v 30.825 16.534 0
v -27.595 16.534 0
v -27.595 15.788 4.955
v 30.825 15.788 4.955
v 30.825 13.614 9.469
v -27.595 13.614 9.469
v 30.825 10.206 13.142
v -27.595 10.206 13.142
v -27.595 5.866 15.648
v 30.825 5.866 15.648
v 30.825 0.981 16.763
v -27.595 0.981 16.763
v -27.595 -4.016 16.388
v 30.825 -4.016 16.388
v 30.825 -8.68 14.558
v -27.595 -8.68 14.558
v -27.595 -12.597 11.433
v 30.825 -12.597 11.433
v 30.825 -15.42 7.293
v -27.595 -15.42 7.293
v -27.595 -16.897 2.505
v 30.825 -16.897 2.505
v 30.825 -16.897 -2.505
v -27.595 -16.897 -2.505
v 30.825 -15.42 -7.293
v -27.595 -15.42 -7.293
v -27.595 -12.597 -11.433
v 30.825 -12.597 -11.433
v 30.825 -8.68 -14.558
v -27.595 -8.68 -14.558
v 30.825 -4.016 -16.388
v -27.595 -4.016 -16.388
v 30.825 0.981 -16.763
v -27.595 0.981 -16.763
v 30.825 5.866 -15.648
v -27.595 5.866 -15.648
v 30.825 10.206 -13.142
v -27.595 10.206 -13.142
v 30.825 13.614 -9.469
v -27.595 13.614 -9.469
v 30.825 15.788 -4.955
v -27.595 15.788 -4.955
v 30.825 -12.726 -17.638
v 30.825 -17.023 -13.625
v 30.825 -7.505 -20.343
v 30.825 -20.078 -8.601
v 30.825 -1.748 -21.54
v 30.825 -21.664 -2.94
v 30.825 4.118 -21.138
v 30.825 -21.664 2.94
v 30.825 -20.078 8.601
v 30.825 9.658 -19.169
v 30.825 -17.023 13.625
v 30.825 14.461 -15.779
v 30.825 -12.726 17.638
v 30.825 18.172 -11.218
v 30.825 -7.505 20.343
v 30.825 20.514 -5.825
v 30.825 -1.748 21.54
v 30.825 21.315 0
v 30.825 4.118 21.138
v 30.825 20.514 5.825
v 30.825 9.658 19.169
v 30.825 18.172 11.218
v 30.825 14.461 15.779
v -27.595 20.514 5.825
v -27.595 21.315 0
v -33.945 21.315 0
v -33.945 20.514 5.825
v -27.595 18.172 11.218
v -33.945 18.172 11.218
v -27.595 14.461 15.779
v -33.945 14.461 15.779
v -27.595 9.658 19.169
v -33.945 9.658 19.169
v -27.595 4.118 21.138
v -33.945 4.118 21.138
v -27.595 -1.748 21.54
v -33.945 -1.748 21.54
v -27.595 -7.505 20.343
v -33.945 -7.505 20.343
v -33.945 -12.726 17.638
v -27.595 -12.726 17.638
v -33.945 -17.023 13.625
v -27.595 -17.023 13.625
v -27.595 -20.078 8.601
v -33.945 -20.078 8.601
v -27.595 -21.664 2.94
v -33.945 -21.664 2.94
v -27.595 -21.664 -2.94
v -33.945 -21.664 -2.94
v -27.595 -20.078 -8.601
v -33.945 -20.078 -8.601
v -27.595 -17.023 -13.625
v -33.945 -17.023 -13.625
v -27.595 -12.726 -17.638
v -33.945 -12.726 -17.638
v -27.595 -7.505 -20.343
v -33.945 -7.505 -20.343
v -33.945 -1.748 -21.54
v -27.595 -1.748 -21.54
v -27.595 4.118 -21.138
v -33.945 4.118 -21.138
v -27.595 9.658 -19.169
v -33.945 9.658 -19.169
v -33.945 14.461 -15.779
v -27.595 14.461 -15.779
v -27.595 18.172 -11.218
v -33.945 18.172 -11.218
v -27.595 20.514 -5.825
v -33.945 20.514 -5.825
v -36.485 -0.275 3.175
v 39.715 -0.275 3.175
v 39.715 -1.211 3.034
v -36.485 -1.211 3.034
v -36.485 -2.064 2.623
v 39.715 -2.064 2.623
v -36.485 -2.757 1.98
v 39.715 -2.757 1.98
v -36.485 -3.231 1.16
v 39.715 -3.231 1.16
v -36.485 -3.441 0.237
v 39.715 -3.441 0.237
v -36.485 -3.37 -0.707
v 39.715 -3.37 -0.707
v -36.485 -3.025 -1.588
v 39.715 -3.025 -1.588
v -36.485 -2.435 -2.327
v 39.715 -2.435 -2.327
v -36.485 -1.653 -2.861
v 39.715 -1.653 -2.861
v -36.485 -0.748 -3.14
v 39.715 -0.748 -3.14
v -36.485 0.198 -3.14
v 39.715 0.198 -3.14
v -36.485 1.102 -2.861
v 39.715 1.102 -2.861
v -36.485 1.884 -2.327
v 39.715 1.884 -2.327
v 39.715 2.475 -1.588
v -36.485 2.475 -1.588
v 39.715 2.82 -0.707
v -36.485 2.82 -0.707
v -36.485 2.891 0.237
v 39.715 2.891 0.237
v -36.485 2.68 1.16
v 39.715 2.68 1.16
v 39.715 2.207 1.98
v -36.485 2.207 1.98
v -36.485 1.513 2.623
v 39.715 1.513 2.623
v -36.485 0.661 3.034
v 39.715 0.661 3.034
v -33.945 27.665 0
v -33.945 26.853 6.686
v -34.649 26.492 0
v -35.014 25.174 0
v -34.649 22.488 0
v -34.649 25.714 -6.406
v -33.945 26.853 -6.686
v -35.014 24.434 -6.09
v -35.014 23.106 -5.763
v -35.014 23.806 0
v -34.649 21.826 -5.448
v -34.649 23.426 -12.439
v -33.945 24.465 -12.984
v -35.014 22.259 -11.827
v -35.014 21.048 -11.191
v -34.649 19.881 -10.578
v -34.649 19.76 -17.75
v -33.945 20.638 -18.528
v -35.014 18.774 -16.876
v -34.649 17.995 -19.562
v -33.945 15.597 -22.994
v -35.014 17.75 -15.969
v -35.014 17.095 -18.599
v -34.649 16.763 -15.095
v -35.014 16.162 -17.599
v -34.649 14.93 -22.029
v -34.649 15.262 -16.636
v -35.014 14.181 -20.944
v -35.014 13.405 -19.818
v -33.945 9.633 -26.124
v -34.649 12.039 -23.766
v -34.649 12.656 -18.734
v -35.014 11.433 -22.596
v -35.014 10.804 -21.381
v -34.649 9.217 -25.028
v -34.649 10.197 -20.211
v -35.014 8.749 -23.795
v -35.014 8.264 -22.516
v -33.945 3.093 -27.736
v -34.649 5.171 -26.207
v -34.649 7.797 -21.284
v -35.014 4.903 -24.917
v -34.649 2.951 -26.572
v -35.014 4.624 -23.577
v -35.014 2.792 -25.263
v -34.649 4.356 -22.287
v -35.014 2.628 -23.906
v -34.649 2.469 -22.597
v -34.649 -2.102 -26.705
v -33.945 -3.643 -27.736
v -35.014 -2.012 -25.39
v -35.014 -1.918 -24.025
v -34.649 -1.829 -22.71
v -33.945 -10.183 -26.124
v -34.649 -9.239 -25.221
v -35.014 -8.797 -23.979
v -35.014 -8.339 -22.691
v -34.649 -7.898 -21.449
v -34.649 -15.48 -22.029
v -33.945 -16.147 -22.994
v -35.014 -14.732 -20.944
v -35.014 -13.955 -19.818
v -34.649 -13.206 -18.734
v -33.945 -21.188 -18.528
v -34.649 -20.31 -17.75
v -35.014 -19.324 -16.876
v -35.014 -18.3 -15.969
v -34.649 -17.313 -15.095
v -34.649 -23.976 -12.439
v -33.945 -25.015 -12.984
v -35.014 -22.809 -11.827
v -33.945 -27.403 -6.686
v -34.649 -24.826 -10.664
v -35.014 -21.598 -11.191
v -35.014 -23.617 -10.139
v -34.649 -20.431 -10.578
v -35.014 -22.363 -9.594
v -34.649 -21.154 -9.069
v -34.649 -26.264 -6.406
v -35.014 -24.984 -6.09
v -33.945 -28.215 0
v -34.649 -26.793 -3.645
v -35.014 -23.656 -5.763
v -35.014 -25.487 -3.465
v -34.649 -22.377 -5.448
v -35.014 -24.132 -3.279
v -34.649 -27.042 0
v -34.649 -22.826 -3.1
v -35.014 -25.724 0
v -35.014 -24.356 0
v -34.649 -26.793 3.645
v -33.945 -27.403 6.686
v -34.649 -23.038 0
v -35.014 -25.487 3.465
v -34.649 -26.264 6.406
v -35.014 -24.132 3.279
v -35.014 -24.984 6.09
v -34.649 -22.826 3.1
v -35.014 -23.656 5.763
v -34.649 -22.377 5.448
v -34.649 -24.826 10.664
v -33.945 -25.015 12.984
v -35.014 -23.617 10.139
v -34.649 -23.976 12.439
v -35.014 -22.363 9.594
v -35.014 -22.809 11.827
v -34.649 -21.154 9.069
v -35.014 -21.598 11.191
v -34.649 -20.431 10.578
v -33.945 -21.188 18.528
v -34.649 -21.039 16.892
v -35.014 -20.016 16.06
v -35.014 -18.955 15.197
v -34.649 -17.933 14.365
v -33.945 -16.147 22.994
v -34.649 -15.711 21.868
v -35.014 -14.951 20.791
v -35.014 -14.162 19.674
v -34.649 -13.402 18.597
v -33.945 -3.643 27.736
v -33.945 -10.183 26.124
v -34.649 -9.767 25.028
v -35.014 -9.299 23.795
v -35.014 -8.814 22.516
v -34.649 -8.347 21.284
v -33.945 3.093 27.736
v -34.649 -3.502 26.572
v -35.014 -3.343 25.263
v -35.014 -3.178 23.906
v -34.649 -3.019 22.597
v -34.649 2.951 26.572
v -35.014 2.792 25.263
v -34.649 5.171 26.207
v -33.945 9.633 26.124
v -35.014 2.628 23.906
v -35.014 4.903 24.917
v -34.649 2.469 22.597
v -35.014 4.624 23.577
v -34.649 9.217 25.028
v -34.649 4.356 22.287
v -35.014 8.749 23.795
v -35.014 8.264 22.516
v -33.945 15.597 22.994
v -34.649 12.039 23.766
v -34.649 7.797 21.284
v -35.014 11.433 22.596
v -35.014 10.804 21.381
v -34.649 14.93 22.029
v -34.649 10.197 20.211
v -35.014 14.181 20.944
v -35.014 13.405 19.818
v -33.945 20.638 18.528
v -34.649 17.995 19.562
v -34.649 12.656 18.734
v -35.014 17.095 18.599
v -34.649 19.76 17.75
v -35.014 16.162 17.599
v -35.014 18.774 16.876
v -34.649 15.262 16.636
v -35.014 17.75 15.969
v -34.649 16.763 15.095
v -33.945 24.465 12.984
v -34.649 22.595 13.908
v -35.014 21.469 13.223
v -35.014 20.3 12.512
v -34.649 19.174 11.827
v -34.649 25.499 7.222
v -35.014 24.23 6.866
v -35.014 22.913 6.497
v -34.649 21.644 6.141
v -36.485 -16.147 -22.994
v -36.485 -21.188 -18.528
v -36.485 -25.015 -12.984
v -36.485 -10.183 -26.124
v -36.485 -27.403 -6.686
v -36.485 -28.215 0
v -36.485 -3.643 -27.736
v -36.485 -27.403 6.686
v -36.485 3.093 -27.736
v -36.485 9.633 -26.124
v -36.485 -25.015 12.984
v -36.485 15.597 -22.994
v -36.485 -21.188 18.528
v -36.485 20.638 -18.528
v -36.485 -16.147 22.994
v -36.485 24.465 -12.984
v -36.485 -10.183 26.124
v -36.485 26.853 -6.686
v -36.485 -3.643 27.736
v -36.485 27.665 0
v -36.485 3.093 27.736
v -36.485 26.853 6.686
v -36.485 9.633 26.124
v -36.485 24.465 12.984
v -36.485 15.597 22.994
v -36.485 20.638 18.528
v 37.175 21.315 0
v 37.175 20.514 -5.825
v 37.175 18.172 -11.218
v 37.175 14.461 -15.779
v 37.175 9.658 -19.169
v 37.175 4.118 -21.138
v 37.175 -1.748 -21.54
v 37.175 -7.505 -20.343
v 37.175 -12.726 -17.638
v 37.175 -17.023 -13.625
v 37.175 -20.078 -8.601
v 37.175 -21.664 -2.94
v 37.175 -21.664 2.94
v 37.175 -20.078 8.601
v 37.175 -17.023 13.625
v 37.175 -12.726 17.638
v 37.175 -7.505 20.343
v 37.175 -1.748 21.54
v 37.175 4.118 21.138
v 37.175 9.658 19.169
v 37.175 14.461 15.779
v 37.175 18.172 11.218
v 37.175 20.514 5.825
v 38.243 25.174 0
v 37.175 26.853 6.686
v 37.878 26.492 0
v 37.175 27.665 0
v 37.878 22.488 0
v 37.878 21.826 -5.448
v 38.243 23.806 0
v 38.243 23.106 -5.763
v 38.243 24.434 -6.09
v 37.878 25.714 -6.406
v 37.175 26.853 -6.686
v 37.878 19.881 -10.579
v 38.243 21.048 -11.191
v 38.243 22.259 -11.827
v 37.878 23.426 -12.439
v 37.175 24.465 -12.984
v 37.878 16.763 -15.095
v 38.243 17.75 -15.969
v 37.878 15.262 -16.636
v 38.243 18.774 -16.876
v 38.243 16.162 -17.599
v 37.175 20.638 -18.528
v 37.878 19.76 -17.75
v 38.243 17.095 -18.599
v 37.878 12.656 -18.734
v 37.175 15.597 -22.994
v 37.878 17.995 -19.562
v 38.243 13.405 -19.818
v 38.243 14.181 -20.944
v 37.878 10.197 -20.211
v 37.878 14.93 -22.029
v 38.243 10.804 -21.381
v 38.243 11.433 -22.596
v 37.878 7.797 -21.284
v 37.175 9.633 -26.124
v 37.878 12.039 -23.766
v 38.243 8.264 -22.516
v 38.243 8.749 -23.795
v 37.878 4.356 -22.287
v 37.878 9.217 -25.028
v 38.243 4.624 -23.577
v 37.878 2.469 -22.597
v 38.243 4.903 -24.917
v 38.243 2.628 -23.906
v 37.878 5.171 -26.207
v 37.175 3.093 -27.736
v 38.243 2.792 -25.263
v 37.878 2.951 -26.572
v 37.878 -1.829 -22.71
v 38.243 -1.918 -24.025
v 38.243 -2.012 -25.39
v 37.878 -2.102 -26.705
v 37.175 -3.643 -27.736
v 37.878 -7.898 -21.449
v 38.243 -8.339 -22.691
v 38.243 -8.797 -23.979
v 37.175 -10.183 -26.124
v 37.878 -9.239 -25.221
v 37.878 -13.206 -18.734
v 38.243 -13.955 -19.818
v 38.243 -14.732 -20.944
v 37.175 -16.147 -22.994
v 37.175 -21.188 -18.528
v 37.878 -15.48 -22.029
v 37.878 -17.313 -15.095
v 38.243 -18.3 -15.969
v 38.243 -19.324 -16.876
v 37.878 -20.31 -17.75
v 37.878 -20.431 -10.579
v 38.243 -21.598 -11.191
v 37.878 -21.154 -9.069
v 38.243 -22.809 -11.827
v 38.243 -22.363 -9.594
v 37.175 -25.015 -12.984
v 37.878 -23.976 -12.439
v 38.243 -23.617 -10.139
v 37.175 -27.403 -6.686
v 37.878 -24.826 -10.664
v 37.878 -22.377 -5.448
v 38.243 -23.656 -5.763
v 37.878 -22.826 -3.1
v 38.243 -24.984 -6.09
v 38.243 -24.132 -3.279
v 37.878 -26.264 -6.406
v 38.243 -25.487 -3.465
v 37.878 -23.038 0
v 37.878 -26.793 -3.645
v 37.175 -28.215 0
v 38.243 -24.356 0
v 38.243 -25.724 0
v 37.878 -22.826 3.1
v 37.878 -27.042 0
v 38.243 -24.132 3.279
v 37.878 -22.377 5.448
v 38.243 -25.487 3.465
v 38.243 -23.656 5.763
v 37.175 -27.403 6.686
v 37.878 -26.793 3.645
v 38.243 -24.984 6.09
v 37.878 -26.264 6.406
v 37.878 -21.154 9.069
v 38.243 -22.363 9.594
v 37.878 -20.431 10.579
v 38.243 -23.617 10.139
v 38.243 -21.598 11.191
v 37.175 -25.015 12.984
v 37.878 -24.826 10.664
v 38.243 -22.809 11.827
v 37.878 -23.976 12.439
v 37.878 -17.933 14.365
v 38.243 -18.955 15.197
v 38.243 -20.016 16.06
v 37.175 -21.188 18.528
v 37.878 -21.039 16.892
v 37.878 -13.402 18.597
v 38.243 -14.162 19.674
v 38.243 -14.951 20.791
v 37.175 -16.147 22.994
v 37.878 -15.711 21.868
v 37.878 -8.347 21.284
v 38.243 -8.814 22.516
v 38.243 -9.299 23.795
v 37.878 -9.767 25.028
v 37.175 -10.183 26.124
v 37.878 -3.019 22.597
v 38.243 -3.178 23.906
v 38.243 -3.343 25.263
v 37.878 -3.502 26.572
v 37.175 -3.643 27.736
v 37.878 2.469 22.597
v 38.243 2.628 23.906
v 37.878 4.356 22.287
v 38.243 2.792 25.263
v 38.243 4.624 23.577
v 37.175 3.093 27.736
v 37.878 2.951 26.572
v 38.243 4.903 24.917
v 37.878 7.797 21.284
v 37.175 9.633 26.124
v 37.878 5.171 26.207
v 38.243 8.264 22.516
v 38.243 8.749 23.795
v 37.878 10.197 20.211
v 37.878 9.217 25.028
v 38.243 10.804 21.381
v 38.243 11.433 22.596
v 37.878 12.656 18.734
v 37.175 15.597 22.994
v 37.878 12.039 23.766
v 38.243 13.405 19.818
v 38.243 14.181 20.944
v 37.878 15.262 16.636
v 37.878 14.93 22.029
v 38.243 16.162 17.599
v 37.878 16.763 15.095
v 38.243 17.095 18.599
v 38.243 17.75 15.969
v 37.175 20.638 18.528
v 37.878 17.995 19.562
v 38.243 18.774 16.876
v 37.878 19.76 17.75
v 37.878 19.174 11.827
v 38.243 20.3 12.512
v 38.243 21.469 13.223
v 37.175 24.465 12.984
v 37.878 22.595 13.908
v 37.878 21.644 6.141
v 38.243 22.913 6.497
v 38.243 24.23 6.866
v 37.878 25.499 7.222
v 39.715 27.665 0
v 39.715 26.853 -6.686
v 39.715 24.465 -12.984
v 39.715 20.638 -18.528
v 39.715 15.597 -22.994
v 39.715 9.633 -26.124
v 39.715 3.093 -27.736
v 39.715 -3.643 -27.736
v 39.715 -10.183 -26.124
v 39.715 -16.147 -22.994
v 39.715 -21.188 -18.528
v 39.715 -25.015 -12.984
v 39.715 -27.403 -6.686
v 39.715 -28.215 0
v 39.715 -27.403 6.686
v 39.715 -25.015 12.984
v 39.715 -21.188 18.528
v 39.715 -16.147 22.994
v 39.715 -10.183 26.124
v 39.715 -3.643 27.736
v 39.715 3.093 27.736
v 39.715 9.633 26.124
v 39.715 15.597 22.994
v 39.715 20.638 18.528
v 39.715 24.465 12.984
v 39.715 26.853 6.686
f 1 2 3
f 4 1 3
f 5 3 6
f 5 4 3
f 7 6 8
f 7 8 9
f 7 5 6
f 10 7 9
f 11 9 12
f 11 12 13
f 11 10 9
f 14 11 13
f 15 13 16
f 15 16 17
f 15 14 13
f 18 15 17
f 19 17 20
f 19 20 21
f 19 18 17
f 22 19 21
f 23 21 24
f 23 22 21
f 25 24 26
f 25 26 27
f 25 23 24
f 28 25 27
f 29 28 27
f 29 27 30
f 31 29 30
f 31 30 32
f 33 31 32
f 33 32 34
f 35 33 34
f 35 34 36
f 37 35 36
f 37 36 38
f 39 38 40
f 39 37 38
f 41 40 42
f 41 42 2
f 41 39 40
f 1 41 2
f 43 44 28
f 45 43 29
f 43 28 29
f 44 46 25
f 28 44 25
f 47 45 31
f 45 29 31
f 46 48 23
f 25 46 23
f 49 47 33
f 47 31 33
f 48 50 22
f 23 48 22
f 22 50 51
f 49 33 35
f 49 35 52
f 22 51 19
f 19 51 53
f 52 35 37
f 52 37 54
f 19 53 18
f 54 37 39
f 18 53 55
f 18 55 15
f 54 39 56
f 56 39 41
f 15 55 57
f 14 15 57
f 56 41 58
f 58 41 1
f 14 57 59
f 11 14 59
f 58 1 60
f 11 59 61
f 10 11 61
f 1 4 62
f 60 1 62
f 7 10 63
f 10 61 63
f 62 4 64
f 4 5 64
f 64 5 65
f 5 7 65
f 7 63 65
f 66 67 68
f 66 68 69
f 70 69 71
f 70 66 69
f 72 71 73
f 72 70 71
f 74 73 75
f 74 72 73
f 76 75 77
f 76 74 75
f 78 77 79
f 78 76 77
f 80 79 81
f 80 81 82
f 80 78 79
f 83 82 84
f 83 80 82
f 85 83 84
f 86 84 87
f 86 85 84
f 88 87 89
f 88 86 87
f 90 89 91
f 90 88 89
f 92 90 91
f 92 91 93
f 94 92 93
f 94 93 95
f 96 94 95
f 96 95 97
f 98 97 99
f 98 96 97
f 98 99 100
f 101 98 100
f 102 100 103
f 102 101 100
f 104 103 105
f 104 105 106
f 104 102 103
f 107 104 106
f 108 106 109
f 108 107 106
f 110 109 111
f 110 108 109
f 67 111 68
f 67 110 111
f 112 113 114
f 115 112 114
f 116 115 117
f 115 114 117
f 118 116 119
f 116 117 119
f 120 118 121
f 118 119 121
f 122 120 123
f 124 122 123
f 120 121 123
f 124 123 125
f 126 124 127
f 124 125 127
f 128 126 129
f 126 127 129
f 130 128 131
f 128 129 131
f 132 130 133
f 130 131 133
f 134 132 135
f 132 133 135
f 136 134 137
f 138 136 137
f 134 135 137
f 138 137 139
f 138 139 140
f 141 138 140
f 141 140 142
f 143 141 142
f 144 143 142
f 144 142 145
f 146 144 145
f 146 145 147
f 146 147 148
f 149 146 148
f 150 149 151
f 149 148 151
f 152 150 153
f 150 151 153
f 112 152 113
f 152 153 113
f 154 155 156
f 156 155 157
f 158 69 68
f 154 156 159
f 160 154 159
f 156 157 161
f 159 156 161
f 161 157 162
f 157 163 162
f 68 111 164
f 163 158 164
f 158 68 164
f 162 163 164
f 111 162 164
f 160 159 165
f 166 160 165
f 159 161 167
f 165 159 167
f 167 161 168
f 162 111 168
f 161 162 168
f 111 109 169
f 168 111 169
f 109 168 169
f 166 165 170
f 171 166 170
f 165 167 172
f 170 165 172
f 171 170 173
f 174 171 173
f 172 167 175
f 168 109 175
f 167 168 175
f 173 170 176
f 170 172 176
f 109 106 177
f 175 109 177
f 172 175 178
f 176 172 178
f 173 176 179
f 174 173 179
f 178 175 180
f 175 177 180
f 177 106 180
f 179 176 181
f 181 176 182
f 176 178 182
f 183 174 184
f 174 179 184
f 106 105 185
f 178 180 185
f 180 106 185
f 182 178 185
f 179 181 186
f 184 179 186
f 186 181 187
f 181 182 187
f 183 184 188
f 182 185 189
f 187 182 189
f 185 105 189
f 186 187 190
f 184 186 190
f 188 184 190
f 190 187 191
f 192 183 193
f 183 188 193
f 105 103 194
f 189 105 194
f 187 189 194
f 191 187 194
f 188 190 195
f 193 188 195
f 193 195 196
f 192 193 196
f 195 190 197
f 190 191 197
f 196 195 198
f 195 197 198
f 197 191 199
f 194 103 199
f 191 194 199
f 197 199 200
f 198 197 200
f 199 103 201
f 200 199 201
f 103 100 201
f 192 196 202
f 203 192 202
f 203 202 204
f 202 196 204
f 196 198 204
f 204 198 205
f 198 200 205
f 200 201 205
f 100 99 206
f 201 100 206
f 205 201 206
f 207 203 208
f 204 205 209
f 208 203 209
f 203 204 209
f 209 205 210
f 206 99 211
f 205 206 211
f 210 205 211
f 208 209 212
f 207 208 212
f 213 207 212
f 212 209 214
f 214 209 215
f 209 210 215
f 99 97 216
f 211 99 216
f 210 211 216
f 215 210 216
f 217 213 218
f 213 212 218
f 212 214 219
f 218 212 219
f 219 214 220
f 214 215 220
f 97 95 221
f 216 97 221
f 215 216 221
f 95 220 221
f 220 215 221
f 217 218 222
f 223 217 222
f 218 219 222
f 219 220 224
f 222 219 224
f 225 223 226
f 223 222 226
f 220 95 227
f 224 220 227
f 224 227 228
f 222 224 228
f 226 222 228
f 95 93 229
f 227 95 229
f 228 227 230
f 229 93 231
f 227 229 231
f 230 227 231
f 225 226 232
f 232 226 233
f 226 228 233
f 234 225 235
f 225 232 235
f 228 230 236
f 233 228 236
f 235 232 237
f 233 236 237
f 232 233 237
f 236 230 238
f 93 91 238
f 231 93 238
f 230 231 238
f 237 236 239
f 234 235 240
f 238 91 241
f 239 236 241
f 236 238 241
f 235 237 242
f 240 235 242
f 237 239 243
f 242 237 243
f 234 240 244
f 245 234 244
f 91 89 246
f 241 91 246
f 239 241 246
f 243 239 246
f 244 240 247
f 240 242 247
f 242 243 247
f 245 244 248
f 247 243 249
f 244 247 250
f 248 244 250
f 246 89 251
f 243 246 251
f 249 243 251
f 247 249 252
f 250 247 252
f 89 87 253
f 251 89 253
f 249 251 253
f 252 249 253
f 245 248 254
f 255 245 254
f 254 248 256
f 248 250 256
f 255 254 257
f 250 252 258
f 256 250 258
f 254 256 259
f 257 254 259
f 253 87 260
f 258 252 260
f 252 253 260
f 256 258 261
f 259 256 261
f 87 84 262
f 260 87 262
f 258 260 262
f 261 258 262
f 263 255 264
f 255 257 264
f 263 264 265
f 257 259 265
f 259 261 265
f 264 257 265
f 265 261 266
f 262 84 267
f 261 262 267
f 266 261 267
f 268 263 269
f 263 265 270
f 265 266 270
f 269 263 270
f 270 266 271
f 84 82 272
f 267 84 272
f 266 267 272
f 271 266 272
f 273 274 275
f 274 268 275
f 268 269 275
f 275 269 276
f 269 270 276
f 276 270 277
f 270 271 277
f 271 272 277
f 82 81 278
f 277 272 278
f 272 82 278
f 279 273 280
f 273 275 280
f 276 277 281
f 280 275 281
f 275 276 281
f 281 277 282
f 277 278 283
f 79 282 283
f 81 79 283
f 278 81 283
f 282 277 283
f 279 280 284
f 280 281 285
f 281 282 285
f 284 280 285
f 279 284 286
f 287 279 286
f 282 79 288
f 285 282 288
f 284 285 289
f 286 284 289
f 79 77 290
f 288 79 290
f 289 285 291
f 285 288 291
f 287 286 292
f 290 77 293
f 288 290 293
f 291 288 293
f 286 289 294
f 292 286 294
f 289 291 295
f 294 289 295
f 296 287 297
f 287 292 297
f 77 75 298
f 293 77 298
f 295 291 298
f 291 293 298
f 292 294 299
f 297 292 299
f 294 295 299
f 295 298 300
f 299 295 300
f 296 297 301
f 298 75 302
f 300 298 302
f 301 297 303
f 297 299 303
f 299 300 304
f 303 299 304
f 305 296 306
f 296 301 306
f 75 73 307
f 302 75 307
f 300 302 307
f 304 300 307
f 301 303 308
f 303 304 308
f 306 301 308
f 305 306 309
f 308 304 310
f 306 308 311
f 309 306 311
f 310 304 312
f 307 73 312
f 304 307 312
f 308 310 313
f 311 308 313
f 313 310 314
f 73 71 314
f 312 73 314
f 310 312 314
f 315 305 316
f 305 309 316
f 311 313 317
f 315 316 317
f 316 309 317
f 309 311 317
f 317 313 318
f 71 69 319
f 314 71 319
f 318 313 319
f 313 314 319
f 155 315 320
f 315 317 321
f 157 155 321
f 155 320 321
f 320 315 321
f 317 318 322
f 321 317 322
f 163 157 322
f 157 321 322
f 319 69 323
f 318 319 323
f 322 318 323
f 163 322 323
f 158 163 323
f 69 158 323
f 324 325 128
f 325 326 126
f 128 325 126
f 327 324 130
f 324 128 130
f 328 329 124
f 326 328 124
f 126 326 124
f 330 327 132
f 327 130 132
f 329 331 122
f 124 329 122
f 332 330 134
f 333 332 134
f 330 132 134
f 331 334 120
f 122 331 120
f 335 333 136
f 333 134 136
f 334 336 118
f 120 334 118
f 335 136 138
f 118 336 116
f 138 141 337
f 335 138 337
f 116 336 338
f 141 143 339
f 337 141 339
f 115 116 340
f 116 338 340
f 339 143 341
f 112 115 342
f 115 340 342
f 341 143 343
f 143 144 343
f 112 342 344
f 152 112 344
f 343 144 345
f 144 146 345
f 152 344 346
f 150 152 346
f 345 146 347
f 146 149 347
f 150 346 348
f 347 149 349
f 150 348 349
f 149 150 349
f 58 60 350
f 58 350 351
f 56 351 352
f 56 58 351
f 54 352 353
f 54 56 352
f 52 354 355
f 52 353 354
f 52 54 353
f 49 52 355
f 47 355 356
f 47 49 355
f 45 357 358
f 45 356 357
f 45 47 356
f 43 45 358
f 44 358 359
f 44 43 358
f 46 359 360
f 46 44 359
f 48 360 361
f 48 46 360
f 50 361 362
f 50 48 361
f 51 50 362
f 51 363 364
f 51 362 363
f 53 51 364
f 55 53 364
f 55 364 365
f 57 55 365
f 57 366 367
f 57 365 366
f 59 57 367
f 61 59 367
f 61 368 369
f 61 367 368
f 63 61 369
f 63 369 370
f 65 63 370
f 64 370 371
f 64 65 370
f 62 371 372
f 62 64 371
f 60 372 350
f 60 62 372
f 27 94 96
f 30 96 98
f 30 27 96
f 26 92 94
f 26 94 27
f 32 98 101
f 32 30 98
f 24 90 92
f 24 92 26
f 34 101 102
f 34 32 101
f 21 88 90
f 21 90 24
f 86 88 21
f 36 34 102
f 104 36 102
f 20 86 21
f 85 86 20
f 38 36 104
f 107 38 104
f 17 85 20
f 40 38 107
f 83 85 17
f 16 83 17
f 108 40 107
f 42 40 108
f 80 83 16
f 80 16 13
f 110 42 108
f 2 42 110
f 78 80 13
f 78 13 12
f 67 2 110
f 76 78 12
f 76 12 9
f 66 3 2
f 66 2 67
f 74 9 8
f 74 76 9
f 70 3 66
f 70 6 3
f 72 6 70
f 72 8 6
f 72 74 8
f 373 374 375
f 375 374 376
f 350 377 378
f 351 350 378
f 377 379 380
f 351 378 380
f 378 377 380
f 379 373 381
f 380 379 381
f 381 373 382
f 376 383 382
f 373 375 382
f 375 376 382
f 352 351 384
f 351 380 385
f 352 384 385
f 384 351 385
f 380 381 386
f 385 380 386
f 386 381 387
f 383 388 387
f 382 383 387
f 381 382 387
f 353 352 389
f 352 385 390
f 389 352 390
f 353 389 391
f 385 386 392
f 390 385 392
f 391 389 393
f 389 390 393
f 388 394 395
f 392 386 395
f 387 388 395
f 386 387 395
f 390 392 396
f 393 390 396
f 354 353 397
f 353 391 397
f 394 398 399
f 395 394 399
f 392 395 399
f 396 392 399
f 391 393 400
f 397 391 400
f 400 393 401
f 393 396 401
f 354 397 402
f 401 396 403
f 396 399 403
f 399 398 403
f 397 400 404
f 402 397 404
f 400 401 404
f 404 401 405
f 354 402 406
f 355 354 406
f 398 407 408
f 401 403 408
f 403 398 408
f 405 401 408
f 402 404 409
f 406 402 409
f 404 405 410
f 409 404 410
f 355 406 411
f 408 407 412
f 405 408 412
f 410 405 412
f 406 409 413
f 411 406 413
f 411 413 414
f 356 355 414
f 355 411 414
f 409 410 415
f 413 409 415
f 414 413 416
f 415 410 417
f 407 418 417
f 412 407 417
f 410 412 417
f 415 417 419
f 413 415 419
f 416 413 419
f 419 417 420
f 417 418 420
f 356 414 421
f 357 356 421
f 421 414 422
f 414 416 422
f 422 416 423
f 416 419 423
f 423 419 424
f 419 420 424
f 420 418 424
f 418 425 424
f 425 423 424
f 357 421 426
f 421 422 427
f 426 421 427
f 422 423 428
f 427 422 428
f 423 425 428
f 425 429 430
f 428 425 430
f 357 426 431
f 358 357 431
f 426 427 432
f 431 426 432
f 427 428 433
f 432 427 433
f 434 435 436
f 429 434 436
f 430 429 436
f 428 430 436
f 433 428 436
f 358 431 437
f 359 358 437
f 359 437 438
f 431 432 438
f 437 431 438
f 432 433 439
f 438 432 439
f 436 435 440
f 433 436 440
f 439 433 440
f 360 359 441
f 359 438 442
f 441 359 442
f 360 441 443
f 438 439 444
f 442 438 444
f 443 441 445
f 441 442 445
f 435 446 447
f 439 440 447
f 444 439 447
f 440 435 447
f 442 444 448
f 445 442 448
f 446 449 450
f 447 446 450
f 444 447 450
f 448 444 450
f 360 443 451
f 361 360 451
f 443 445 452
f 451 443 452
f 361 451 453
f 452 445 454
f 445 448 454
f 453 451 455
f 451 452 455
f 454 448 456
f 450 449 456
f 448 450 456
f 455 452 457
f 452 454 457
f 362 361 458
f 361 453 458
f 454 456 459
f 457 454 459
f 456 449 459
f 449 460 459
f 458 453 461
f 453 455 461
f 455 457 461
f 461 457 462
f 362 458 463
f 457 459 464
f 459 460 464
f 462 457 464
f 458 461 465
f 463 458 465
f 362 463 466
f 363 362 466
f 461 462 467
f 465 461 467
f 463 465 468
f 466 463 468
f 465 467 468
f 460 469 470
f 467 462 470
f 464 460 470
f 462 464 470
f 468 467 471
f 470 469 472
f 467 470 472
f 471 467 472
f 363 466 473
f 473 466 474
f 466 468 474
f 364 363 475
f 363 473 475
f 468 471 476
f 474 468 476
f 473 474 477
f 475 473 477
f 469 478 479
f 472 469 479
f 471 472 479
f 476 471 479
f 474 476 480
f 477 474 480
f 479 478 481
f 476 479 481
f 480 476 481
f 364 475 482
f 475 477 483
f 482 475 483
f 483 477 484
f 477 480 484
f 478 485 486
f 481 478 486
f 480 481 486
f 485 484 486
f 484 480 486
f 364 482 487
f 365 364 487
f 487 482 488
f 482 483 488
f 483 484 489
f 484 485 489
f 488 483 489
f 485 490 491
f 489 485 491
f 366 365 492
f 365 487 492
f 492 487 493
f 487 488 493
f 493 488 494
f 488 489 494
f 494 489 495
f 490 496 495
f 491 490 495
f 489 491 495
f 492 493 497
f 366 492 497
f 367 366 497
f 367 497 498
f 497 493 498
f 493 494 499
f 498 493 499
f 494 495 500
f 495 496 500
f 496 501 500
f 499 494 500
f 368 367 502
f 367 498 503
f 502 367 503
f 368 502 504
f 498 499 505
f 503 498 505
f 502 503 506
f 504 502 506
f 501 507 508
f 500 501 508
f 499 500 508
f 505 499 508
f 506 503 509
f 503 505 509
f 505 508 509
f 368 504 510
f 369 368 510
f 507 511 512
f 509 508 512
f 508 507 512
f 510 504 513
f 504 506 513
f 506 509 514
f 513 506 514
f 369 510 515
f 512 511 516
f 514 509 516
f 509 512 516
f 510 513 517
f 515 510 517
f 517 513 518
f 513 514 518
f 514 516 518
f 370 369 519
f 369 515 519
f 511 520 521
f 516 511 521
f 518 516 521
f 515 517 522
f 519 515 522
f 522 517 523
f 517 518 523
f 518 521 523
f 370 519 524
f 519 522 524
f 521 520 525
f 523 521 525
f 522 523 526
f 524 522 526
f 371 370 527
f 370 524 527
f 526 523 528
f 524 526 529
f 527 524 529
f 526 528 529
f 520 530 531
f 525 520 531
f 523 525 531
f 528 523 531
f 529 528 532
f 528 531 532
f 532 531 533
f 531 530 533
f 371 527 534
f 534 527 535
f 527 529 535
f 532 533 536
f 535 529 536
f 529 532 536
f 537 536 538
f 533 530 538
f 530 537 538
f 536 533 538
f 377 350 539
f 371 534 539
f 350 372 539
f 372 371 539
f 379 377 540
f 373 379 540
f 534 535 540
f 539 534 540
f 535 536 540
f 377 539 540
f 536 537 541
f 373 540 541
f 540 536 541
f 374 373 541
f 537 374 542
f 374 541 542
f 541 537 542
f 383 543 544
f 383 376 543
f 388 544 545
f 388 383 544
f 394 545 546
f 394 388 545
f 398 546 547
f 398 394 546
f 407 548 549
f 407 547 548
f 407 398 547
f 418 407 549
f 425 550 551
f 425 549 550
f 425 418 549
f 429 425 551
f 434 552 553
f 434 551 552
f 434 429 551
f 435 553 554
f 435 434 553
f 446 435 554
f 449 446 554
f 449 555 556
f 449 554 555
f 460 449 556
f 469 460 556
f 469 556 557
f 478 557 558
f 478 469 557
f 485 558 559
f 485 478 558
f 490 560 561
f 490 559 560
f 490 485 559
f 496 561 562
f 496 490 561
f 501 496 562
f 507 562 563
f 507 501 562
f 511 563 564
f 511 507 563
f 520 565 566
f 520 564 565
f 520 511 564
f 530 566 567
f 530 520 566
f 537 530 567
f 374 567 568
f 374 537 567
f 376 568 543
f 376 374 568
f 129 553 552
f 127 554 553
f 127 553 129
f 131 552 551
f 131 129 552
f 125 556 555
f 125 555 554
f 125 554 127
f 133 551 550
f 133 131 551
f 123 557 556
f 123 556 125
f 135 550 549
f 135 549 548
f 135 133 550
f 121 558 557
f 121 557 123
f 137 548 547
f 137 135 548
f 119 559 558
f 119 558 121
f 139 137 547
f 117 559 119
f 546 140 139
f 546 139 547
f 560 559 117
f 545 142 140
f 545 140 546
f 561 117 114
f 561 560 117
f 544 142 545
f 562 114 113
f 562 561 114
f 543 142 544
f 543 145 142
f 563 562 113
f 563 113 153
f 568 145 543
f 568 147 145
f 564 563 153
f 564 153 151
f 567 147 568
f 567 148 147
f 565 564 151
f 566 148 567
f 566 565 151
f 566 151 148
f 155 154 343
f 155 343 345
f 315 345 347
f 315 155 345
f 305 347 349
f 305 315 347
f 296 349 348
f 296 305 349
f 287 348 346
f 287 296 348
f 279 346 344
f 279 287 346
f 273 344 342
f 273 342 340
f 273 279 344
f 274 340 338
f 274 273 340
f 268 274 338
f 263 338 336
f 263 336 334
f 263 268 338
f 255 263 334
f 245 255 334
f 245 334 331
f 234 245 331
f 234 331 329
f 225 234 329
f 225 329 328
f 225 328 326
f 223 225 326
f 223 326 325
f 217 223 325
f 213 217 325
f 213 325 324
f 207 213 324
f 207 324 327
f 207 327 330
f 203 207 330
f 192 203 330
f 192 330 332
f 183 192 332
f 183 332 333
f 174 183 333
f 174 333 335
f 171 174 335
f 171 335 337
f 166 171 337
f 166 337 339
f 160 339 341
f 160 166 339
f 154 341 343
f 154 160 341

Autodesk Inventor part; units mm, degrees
ref_plane "YZ Plane" through (0, 0, 0) normal (1, 0, 0) x (0, 1, 0)
ref_plane "XZ Plane" through (0, 0, 0) normal (0, 1, 0) x (-1, 0, 0)
ref_plane "XY Plane" through (0, 0, 0) normal (0, 0, 1) x (1, 0, 0)
sketch "Sketch1" plane through (0, 0, 0) normal (0, 0, 1) x (1, 0, 0)
  line L0 (-36.4853, -0.2751) -> (39.7147, -0.2751)
  line L1 (-36.4853, -0.2751) -> (-36.4853, 27.6649)
  line L2 (-36.4853, 27.6649) -> (-33.9453, 27.6649)
  arc A0 (-33.9453, 27.6649) -> (-33.9453, 21.3149) centre (-29.9798, 24.4899) ccw
  line L3 (-33.9453, 21.3149) -> (-27.5953, 21.3149)
  line L4 (-27.5953, 21.3149) -> (-27.5953, 16.5345)
  line L5 (39.7147, -0.2751) -> (39.7147, 27.6649)
  line L6 (39.7147, 27.6649) -> (37.1747, 27.6649)
  arc A1 (37.1747, 21.3149) -> (37.1747, 27.6649) centre (33.2091, 24.4899) ccw
  line L7 (37.1747, 21.3149) -> (30.8247, 21.3149)
  line L8 (30.8247, 21.3149) -> (30.8247, 16.5345)
  line L9 (-27.5953, 16.5345) -> (30.8247, 16.5345)
  point P0 (0, 0)
  dimension "d0" = 76.2
  dimension "d1" = 27.94
  dimension "d2" = 2.54
  dimension "d3" = 6.35
  dimension "d4" = 5.08
  dimension "d5" = 6.35
revolve "Revolution1" add sketch "Sketch1" angle 360 about axis through (-36.4853, -0.2751, 0) along (1, 0, 0)
sketch "Sketch2" plane through (0, 0, 0) normal (1, 0, 0) x (0, 1, 0)
  circle A0 centre (0, 0) radius 3.175
  circle A1 centre (0, 0) radius 3.175
sketch "Sketch3" plane through (-36.4853, -0.2751, 0) normal (-1, 0, 0) x (0, 0, 1)
  circle A0 centre (0, 0.2751) radius 3.175
  circle A1 centre (0, 0) radius 27.94 projected
  dimension "d9" = 6.35
  dimension "d10" = 25.0401
hole "Hole1" at (-36.4853, -0.2751, 0) direction (1, 0, 0) diameter 6.35 end through all both
sketch "Sketch4" plane through (-36.4853, -0.2751, 0) normal (-1, 0, 0) x (0, 0, 1)
  point P0 (0, 0.2751)
sketch "Sketch5" plane through (-36.4853, -0.2751, 0) normal (-1, 0, 0) x (0, 0, 1)
  point P0 (0, 0.2751)
sketch "Sketch6" plane through (39.7147, -0.2751, 0) normal (1, 0, 0) x (0, 0, -1)
  point P0 (0, 0.2751)
sketch "Sketch7" plane through (0, 0, 0) normal (1, 0, 0) x (0, 1, 0)
  point P0 (0, 0)
properties part number "weel 2.2"
